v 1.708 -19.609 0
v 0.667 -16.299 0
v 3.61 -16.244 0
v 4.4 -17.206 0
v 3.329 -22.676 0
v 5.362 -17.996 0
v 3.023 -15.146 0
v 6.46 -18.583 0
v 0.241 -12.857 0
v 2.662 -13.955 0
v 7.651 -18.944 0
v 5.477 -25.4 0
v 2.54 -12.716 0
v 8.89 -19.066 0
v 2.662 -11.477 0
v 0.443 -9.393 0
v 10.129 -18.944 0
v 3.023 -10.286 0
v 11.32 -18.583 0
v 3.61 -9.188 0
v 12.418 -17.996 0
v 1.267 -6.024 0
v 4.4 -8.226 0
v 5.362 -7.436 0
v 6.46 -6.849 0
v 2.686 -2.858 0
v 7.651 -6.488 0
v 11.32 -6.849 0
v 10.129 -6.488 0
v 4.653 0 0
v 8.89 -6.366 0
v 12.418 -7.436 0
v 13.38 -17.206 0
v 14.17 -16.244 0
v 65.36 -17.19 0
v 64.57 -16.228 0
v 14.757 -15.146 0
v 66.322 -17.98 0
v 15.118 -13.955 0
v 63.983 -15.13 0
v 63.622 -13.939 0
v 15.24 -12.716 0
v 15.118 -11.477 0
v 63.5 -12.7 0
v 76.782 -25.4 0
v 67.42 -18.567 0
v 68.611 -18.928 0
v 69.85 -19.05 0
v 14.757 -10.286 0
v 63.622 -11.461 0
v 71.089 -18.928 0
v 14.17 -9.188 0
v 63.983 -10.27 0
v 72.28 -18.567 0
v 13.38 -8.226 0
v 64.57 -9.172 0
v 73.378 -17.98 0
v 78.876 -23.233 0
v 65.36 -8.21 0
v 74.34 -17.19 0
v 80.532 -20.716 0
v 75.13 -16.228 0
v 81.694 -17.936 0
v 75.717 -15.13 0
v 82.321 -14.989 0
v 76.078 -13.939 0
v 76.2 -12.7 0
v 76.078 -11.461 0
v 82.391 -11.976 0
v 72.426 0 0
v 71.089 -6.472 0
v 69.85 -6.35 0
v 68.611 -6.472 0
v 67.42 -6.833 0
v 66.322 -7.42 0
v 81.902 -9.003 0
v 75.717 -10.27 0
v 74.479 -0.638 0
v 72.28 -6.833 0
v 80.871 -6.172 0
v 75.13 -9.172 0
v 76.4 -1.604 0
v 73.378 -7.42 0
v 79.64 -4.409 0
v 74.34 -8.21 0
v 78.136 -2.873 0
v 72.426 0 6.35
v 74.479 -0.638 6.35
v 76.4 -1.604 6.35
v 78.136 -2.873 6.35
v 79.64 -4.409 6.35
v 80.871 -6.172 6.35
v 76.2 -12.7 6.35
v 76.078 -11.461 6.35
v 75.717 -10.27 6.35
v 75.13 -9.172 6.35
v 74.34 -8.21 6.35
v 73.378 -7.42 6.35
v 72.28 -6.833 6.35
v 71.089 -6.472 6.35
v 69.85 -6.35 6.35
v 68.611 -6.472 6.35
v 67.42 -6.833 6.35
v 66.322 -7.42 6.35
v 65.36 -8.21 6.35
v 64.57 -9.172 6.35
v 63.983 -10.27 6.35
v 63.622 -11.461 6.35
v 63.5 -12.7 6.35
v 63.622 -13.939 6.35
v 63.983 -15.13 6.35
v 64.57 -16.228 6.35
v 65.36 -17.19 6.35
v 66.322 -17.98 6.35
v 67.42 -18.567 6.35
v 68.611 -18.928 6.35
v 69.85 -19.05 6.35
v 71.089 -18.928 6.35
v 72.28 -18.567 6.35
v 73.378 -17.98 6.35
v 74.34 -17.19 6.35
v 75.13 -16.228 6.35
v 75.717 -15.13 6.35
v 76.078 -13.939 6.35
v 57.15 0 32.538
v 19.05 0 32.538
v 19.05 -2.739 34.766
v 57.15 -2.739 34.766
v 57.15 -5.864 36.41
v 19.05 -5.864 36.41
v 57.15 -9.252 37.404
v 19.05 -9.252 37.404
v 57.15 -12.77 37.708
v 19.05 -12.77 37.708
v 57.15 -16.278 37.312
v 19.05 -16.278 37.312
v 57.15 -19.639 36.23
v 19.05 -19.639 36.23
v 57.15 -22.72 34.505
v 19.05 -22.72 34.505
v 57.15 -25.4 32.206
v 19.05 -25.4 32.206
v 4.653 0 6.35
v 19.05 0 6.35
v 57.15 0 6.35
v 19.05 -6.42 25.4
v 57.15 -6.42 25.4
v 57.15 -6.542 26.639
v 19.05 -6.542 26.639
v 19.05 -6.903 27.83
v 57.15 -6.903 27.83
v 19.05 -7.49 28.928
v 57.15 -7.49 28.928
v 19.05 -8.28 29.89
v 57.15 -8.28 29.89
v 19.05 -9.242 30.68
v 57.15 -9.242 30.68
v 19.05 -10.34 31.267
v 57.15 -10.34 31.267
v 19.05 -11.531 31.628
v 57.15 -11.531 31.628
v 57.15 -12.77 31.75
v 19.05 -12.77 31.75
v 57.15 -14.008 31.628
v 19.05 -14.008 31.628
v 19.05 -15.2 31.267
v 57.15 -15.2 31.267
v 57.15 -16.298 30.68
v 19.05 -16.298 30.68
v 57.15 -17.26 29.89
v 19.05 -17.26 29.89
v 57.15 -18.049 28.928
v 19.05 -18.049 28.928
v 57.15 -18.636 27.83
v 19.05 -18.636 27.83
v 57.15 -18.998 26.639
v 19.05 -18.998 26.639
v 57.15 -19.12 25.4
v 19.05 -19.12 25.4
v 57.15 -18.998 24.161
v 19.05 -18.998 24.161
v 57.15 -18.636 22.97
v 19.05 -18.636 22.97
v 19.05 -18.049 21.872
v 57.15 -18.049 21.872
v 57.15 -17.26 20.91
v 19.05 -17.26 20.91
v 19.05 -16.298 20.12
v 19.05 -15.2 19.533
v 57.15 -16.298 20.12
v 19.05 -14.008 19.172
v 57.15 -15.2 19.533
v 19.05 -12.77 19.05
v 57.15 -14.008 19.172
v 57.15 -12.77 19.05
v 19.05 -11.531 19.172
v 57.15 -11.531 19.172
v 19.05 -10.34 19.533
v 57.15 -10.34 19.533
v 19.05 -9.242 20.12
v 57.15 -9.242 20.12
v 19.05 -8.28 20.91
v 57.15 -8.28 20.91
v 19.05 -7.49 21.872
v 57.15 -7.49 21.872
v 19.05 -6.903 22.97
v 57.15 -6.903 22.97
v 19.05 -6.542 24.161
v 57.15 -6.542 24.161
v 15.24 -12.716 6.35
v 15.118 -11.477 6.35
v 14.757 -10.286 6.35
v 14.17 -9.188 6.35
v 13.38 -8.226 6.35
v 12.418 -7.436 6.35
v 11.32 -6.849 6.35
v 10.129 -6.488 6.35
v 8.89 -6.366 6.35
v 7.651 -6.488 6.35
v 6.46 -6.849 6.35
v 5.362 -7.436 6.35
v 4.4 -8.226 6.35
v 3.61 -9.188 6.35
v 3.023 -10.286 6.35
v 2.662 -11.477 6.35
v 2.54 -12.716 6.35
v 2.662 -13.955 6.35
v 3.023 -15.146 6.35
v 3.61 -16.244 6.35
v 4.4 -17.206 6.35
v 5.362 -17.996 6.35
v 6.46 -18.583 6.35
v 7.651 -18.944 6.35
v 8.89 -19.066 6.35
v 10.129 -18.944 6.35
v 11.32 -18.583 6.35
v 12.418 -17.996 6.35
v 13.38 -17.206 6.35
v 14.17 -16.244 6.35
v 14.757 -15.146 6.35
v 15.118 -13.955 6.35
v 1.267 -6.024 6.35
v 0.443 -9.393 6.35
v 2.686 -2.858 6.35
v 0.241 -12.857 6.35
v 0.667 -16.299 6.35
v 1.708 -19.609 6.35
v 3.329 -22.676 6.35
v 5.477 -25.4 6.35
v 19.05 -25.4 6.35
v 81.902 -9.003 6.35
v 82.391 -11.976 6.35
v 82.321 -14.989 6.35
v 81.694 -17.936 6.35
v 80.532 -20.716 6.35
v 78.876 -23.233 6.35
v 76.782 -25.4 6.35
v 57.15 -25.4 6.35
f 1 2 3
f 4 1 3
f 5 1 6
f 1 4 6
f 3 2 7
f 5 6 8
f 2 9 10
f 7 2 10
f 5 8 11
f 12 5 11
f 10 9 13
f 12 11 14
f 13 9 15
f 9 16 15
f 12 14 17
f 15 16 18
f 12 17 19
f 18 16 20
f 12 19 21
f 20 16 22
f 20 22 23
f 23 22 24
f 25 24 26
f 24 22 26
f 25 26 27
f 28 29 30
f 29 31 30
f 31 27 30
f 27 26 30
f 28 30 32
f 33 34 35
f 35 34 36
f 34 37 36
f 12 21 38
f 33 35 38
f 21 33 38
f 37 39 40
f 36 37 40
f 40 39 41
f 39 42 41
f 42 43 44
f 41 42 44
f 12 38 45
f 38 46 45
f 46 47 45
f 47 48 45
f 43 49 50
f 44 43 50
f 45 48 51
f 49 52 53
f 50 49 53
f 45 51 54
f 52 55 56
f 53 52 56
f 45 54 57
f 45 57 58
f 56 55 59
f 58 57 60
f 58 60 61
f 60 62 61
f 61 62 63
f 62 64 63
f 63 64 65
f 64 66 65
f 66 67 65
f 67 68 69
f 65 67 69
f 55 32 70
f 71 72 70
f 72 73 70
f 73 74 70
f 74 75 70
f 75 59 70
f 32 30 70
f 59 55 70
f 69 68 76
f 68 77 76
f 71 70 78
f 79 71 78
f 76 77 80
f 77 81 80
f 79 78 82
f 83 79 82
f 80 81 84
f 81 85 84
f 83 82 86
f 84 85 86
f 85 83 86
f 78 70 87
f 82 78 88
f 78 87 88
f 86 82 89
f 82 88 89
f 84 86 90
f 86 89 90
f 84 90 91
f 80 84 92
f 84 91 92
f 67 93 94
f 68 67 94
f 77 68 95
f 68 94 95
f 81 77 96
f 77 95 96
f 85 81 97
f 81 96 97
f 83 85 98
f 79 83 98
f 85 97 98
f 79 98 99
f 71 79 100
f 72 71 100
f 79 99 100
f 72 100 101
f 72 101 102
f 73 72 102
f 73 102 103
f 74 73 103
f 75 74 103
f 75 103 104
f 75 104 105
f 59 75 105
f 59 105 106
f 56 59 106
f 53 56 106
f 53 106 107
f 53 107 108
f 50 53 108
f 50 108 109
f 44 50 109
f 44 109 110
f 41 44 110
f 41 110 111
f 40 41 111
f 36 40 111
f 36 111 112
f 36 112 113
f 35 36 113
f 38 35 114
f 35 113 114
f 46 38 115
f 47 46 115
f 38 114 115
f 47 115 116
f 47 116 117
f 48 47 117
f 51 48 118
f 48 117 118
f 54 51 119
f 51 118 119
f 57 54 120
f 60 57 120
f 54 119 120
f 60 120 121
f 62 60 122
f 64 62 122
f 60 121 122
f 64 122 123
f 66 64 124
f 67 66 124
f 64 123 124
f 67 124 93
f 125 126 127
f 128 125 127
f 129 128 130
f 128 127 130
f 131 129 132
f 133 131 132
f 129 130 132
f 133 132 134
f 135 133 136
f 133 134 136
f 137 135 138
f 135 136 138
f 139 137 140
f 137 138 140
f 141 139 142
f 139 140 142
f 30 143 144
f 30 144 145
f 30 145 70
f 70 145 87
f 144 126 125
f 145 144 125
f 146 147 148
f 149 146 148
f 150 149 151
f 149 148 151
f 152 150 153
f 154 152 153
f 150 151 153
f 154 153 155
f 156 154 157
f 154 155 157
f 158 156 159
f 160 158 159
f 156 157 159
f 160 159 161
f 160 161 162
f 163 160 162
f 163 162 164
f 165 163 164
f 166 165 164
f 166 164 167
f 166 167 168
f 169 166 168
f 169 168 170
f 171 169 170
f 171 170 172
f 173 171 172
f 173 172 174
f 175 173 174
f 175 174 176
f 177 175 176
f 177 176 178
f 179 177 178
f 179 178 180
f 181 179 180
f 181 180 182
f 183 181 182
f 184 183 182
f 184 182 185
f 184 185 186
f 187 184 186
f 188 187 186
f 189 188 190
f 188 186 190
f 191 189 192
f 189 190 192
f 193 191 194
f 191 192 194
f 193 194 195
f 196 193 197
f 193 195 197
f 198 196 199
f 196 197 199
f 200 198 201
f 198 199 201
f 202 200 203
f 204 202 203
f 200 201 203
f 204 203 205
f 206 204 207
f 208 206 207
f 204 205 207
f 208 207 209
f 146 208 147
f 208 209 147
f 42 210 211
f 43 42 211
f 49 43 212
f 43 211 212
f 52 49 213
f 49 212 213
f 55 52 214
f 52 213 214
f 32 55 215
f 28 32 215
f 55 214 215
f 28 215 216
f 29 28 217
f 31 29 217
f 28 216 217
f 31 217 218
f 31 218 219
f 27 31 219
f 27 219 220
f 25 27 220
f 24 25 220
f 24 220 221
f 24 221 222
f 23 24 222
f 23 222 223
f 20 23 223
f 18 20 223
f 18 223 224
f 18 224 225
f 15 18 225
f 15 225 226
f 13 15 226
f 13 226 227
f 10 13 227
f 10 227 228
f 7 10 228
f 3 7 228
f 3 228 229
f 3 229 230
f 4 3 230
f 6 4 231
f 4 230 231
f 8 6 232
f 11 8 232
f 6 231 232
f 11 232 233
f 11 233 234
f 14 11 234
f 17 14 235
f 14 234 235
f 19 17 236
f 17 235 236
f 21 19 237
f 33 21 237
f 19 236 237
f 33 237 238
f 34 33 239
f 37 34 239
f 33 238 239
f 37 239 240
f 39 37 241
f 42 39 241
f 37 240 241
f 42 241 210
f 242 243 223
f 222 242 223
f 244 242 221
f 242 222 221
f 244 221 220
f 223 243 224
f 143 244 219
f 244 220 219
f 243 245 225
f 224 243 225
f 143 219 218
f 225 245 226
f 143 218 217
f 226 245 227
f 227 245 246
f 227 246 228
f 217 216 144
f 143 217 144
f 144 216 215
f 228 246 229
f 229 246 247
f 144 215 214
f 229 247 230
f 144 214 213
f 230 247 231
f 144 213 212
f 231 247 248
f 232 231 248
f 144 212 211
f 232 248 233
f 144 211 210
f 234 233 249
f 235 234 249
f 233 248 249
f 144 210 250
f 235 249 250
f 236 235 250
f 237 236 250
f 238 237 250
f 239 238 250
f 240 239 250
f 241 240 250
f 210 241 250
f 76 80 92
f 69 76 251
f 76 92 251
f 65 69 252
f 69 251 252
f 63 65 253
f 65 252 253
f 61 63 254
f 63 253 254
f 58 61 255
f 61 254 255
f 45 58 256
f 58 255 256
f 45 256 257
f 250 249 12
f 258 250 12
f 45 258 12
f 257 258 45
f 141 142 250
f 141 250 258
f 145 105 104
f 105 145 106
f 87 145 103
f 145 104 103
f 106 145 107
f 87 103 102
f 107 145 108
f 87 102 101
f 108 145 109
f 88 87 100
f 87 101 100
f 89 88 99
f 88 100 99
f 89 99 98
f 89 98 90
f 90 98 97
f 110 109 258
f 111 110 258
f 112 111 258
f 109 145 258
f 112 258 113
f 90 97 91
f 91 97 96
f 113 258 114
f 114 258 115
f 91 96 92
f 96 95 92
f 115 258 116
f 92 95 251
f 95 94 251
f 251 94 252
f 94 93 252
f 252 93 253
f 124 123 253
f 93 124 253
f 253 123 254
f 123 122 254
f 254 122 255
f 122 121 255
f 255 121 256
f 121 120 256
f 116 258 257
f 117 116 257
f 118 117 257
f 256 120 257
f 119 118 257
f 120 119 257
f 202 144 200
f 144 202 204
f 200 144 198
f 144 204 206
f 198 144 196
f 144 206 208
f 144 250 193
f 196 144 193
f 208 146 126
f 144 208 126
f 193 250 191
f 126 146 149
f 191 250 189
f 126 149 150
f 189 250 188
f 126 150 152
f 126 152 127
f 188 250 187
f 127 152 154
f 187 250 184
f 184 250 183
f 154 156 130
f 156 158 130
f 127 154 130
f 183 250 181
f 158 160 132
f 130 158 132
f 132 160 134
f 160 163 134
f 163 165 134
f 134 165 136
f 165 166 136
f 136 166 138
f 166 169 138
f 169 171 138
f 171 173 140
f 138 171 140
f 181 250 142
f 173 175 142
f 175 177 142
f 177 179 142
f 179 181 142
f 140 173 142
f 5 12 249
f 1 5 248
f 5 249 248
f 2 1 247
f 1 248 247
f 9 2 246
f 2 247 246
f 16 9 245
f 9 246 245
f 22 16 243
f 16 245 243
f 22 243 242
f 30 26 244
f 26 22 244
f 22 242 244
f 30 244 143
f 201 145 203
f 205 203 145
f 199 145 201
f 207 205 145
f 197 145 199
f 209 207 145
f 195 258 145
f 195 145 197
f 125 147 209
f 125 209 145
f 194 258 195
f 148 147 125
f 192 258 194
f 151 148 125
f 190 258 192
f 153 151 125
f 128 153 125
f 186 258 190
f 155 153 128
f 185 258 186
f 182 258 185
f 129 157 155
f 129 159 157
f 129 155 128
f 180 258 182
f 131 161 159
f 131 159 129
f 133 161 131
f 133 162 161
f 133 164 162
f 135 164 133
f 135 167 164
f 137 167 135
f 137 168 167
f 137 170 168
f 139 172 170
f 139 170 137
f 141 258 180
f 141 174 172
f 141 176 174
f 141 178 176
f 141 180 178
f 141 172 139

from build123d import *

# Parameters (mm, degrees)
F0_W      = 82.55
F0_H      = 38.1
F1_DEPTH  = 25.4
F2_W      = 25.4
F2_H      = 31.75
F3_DEPTH  = 25.4
F4_W      = 19.05
F4_H      = 31.75
F5_DEPTH  = 25.4
F6_R      = 6.35
F7_DEPTH  = 25.4
F8_R      = 6.35
F9_DEPTH  = 25.4
F11_DEPTH = 38.1
F12_R     = 6.35
F13_DEPTH = 50.8
F15_DEPTH = 50.8
F17_DEPTH = 50.8
F19_DEPTH = 25.4


with BuildPart() as f1:
    # F0 (on Front) → F1 (new body)
    with BuildSketch(Plane.XZ):
        with Locations((41.275, 19.05)):
            Rectangle(F0_W, F0_H)
    extrude(amount=F1_DEPTH)

    # F2 (on face) → F3 (cut)
    with BuildSketch(Plane.XZ.offset(25.4)):
        with Locations((69.85, 22.225)):
            Rectangle(F2_W, F2_H)
    extrude(amount=-F3_DEPTH, mode=Mode.SUBTRACT)

    # F4 (on face) → F5 (cut)
    with BuildSketch(Plane.XZ.offset(25.4)):
        with Locations((9.525, 22.225)):
            Rectangle(F4_W, F4_H)
    extrude(amount=-F5_DEPTH, mode=Mode.SUBTRACT)

    # F6 (on face) → F7 (cut)
    with BuildSketch(Plane.XY.offset(6.35)):
        with Locations((69.85, -12.7)):
            Circle(F6_R)
    extrude(amount=-F7_DEPTH, mode=Mode.SUBTRACT)

    # F8 (on face) → F9 (cut)
    with BuildSketch(Plane.XY.offset(6.35)):
        with Locations((8.8900124169, -12.7158843127)):
            Circle(F8_R)
    extrude(amount=-F9_DEPTH, mode=Mode.SUBTRACT)

    # F10 (on face) → F11 (cut)
    with BuildSketch(Plane(origin=(19.05, 0, 0), x_dir=(0, -1, 0), z_dir=(-1, 0, 0))):
        with BuildLine():
            ThreePointArc((0, 32.5376726687), (12.769661319, 37.7082569413), (25.4, 32.2060994804))
            Line((25.4, 32.2060994804), (25.4, 38.1))
            Line((25.4, 38.1), (0, 38.1))
            Line((0, 38.1), (0, 32.5376726687))
        make_face()
    extrude(amount=-F11_DEPTH, mode=Mode.SUBTRACT)

    # F12 (on face) → F13 (cut)
    with BuildSketch(Plane.YZ.offset(57.15)):
        with Locations((-12.769661319, 25.3998726321)):
            Circle(F12_R)
    extrude(amount=-F13_DEPTH, mode=Mode.SUBTRACT)

    # F14 (on face) → F15 (cut)
    with BuildSketch(Plane.XY.offset(6.35)):
        with BuildLine():
            ThreePointArc((5.4768570699, -25.4), (0.241233284, -12.8565406161), (4.6525248326, 0))
            Line((4.6525248326, 0), (0, 0))
            Line((0, 0), (0, -25.4))
            Line((0, -25.4), (5.4768570699, -25.4))
        make_face()
    extrude(amount=-F15_DEPTH, mode=Mode.SUBTRACT)

    # F16 (on face) → F17 (cut)
    with BuildSketch(Plane.XY.offset(6.35)):
        with BuildLine():
            ThreePointArc((75.7511779666, 0), (82.4170329692, -12.4504834206), (76.7815932631, -25.4))
            Line((76.7815932631, -25.4), (82.55, -25.4))
            Line((82.55, -25.4), (82.55, 0))
            Line((82.55, 0), (75.7511779666, 0))
        make_face()
    extrude(amount=-F17_DEPTH, mode=Mode.SUBTRACT)

    # F18 (on face) → F19 (cut)
    with BuildSketch(Plane.XY.offset(6.35)):
        with BuildLine():
            ThreePointArc((72.4261626601, 0), (77.2939859852, -2.2026454539), (80.8707558382, -6.1717849498))
            ThreePointArc((80.8707558382, -6.1717849498), (78.6988634902, -2.7641270855), (75.7511779666, 0))
            Line((75.7511779666, 0), (72.4261626601, 0))
        make_face()
    extrude(amount=-F19_DEPTH, mode=Mode.SUBTRACT)


solid = f1.part
